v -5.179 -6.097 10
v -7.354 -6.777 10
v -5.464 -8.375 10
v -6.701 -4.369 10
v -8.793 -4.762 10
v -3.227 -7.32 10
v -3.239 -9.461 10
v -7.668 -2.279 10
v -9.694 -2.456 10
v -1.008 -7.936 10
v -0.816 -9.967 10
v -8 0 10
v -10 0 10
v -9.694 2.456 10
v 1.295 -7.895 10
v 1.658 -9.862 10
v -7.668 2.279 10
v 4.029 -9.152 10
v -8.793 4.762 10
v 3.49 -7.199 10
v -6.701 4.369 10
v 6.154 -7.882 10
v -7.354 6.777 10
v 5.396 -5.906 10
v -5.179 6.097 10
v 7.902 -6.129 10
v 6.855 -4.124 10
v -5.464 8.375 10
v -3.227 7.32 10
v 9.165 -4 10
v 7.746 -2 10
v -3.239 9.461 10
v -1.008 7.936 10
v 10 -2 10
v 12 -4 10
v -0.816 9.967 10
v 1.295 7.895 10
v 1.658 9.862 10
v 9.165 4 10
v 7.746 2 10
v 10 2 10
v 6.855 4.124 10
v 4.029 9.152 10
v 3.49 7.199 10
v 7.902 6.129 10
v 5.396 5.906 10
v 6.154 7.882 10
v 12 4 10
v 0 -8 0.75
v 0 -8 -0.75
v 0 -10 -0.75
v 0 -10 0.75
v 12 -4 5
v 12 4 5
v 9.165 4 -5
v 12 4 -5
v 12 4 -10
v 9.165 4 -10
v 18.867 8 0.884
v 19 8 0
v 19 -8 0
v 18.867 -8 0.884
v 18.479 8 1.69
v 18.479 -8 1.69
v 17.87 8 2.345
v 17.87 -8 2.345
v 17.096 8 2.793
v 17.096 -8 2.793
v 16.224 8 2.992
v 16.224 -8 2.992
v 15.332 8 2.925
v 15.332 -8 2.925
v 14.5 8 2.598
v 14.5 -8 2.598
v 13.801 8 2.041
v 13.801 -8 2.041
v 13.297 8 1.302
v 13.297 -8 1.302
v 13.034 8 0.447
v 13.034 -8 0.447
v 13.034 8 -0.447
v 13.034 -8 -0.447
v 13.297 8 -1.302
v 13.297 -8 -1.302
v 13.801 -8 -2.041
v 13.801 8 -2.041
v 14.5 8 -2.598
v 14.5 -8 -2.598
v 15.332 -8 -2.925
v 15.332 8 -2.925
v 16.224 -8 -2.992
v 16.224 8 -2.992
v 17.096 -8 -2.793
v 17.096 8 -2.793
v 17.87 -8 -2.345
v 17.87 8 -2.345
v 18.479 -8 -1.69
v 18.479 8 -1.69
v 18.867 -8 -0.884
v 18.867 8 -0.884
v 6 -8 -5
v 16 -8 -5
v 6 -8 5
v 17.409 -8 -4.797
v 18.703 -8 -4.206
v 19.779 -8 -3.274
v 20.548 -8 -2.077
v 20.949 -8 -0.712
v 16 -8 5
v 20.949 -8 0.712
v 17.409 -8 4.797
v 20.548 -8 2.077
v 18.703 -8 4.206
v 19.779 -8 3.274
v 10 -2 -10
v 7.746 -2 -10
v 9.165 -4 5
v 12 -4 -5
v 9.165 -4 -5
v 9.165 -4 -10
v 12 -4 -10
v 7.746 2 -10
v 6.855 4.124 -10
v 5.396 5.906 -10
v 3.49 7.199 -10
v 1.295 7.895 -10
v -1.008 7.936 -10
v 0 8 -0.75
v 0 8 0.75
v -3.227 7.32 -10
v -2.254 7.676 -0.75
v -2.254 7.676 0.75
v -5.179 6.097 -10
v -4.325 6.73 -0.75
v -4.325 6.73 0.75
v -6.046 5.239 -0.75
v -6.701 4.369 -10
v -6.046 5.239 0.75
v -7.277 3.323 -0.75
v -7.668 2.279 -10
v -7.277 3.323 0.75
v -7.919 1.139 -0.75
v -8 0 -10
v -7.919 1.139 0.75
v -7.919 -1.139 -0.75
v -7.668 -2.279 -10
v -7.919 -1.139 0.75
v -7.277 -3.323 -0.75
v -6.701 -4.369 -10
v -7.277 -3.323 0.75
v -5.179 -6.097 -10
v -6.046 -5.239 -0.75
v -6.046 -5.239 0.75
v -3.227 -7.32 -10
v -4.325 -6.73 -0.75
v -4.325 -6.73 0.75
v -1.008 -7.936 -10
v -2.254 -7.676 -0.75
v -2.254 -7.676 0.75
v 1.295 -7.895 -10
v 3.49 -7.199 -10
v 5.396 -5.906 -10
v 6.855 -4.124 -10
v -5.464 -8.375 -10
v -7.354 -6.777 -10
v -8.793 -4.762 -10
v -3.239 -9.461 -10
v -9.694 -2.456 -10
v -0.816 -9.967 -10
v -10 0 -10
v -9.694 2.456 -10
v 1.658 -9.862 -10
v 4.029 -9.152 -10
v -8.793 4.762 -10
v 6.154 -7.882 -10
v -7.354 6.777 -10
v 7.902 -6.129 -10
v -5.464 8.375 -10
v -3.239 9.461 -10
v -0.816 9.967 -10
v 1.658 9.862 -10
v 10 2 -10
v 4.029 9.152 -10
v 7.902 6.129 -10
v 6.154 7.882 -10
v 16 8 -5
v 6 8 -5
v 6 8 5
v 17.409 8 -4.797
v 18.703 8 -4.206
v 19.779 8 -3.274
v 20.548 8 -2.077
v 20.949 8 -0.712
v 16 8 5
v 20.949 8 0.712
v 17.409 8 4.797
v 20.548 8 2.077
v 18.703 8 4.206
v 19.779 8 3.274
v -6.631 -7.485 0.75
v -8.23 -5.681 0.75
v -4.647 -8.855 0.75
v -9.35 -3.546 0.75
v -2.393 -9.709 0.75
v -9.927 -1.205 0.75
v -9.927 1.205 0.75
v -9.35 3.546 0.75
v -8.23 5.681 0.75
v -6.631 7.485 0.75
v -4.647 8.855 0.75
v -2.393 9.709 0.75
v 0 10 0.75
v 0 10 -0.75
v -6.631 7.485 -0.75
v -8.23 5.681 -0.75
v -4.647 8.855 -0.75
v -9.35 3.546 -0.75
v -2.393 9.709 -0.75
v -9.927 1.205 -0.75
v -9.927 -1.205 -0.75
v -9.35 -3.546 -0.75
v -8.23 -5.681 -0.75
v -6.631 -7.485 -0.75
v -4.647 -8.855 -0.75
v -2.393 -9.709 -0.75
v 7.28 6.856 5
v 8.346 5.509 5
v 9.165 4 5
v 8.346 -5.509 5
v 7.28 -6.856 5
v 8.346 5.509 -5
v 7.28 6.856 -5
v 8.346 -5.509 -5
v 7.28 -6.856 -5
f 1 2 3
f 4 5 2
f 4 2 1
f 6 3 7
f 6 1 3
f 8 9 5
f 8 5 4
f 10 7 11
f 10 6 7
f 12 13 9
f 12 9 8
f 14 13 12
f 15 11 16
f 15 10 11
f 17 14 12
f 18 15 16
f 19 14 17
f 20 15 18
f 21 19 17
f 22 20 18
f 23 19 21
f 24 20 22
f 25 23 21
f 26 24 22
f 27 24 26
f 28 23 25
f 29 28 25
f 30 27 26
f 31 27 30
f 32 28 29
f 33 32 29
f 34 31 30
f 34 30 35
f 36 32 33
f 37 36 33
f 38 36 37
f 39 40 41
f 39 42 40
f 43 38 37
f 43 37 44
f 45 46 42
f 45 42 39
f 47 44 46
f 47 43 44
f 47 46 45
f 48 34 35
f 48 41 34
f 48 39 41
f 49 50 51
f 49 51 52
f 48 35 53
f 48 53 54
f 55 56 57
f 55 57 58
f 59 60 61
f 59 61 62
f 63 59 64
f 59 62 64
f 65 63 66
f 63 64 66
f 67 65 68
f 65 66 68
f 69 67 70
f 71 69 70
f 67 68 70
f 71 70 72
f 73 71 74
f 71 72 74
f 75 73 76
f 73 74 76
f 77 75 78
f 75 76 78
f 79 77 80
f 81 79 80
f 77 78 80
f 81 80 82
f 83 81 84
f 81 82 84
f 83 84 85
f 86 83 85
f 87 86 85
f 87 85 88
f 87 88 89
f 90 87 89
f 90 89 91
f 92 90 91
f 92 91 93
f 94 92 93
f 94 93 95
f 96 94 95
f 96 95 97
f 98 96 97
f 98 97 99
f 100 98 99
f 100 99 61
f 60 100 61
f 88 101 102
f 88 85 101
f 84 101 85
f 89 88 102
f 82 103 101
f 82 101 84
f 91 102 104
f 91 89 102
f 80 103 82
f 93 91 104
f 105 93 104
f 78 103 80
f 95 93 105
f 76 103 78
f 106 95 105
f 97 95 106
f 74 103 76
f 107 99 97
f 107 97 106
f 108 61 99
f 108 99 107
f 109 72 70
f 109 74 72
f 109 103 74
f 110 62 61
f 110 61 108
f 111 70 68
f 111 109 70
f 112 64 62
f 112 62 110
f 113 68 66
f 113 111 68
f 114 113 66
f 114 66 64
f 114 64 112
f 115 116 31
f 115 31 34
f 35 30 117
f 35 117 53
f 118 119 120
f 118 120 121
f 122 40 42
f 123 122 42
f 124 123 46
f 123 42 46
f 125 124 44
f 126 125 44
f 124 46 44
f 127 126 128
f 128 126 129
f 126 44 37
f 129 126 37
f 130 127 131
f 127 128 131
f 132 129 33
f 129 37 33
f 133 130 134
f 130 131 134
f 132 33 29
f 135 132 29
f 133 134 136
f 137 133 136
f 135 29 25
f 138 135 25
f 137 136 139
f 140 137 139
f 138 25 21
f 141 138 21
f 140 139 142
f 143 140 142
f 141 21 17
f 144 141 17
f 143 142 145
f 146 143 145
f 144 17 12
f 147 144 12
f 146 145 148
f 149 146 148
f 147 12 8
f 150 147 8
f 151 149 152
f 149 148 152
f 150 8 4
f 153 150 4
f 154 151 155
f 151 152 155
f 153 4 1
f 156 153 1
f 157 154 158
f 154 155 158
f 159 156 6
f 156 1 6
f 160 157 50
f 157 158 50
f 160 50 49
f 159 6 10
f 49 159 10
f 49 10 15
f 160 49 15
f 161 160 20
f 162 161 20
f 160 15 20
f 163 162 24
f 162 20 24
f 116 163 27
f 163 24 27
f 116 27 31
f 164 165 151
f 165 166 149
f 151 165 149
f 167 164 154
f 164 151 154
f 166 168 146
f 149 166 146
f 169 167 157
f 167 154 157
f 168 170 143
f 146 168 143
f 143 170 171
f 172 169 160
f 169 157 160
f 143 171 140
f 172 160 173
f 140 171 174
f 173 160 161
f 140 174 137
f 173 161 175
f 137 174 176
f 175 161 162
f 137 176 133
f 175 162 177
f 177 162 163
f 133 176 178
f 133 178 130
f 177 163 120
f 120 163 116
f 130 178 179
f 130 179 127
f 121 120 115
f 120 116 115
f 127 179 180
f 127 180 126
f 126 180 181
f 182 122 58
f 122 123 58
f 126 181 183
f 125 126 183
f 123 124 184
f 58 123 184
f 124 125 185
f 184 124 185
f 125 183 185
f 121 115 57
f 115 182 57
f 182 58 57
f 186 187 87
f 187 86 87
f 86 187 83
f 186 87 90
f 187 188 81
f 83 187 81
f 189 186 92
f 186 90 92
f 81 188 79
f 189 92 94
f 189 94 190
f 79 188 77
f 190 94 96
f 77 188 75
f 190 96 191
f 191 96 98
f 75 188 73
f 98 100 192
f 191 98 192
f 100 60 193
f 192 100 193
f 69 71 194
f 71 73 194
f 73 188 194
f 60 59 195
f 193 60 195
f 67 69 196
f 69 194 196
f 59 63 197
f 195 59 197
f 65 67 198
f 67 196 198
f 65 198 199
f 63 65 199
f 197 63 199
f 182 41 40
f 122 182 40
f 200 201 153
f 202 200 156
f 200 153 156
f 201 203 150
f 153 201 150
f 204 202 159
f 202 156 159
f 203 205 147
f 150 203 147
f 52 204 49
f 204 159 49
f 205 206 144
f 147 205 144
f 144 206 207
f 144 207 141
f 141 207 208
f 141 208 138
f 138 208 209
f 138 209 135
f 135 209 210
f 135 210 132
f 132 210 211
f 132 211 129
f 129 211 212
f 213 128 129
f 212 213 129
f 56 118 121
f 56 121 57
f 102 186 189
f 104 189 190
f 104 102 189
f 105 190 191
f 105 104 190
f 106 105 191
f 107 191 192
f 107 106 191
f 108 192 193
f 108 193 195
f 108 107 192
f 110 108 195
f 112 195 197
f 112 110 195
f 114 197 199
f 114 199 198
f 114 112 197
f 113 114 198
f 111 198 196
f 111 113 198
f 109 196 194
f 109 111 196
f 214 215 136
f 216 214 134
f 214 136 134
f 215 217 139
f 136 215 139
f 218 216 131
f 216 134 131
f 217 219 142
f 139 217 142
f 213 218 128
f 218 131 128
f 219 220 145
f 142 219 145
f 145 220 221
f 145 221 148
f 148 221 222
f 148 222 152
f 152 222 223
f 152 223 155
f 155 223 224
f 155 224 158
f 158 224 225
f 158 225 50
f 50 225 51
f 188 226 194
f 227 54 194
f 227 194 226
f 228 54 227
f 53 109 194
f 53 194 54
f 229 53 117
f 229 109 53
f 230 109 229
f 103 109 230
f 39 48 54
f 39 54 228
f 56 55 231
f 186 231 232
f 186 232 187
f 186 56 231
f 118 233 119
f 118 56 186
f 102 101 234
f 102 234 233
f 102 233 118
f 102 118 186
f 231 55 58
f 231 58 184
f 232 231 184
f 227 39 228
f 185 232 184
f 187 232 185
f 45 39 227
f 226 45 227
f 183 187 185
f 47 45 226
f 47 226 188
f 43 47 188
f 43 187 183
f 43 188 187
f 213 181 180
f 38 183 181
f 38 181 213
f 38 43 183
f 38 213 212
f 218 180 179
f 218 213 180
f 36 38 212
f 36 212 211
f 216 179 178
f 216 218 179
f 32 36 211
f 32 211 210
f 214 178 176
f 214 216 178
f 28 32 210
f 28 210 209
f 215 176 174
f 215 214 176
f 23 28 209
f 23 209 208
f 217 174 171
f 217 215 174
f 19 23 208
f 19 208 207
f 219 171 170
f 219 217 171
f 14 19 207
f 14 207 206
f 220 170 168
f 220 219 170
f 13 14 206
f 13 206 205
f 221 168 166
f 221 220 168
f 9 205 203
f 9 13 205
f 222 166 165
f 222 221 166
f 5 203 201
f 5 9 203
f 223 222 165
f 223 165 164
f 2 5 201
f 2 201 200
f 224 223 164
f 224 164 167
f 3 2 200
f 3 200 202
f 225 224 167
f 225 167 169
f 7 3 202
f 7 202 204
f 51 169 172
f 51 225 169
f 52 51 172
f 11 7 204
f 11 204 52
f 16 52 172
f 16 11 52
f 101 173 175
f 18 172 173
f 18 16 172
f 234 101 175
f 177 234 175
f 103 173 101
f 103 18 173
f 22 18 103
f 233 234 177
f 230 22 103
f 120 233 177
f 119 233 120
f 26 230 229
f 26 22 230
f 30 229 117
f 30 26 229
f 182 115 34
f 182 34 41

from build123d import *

# Parameters (mm, degrees)
F1_DEPTH      = 10
F1_DEPTH_BACK = 10
F3_DEPTH      = 8
F3_DEPTH_BACK = 8
F5_DEPTH      = 20.001
F6_R          = 3
F7_DEPTH      = 18.001
F8_W          = 12
F8_H          = 1.5
F9_DEPTH      = 10.001
F9_DEPTH_BACK = 10.001


with BuildPart() as f1:
    # F0 (on Top) → F1 (new body, two sides)
    with BuildSketch(Plane.XY) as f1_sk:
        with BuildLine():
            Line((12, 4), (9.1651513899, 4))
            ThreePointArc((9.1651513899, 4), (-10, 0), (9.1651513899, -4))
            Line((9.1651513899, -4), (12, -4))
            Line((12, -4), (12, 4))
        make_face()
    extrude(amount=F1_DEPTH)
    extrude(f1_sk.sketch, amount=-F1_DEPTH_BACK)

    # F2 (on Front) → F3 (join, two sides)
    with BuildSketch(Plane.XZ) as f3_sk:
        with BuildLine():
            Line((16, 5), (0, 5))
            Line((0, 5), (0, -5))
            Line((0, -5), (16, -5))
            ThreePointArc((16, -5), (21, 0), (16, 5))
        make_face()
    extrude(amount=F3_DEPTH)
    extrude(f3_sk.sketch, amount=-F3_DEPTH_BACK)

    # F4 (on face) → F5 (cut, through all)
    with BuildSketch(Plane.XY.offset(10)):
        with BuildLine():
            Line((10, 2), (7.7459666924, 2))
            ThreePointArc((7.7459666924, 2), (-8, 0), (7.7459666924, -2))
            Line((7.7459666924, -2), (10, -2))
            Line((10, -2), (10, 2))
        make_face()
    extrude(amount=-F5_DEPTH, mode=Mode.SUBTRACT)

    # F6 (on face) → F7 (cut, through all)
    with BuildSketch(Plane.XZ.offset(8)):
        with Locations((16, 0)):
            Circle(F6_R)
    extrude(amount=-F7_DEPTH, mode=Mode.SUBTRACT)

    # F8 (on Front) → F9 (cut, two sides)
    with BuildSketch(Plane.XZ) as f9_sk:
        with Locations((-6, 0)):
            Rectangle(F8_W, F8_H)
    extrude(amount=-F9_DEPTH, mode=Mode.SUBTRACT)
    extrude(f9_sk.sketch, amount=F9_DEPTH_BACK, mode=Mode.SUBTRACT)


solid = f1.part
